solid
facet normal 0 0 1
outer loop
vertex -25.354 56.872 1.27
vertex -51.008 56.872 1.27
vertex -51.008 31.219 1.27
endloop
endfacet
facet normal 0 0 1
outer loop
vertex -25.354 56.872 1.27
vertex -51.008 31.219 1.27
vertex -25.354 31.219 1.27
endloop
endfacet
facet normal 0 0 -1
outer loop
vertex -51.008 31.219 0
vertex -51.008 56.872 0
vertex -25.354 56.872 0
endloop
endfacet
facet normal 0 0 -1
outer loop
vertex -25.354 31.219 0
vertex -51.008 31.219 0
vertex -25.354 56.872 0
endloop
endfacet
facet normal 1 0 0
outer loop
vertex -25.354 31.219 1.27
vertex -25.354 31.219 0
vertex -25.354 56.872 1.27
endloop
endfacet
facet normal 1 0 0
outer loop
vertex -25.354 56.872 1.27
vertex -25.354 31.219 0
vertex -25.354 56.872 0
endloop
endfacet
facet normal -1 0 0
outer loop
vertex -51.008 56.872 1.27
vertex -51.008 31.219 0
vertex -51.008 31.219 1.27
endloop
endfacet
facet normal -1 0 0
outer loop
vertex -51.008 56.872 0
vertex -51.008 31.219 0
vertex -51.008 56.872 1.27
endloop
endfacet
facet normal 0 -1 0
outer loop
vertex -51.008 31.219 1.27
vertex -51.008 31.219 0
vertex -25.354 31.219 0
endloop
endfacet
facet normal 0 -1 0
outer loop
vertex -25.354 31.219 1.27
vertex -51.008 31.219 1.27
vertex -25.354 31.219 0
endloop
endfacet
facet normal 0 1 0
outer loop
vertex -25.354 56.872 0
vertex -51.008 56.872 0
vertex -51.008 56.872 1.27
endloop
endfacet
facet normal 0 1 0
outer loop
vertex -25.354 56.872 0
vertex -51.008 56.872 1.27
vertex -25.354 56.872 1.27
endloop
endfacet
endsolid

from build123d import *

# Parameters (mm, degrees)
F0_W     = 60.033172369
F0_H     = 71.0732936859
F1_DEPTH = 1.27
F2_DEPTH = 45.42028
F3_DEPTH = 34.3789


with BuildPart() as f1:
    # F0 (on Top) → F1 (new body)
    with BuildSketch(Plane.XY):
        with Locations((-20.9914129227, 21.3353335857)):
            Rectangle(F0_W, F0_H)
    extrude(amount=F1_DEPTH)

    # F2 (cut): a face of the model
    f2_faces = [f1.faces().sort_by_distance(p)[0] for p in [
        (-20.9914129227, -14.2013132572, 0.635),
    ]]
    extrude(f2_faces, amount=-F2_DEPTH, mode=Mode.SUBTRACT)

    # F3 (cut): a face of the model
    f3_faces = [f1.faces().sort_by_distance(p)[0] for p in [
        (9.0251732618, 44.0454735857, 0.635),
    ]]
    extrude(f3_faces, amount=-F3_DEPTH, mode=Mode.SUBTRACT)


solid = f1.part
